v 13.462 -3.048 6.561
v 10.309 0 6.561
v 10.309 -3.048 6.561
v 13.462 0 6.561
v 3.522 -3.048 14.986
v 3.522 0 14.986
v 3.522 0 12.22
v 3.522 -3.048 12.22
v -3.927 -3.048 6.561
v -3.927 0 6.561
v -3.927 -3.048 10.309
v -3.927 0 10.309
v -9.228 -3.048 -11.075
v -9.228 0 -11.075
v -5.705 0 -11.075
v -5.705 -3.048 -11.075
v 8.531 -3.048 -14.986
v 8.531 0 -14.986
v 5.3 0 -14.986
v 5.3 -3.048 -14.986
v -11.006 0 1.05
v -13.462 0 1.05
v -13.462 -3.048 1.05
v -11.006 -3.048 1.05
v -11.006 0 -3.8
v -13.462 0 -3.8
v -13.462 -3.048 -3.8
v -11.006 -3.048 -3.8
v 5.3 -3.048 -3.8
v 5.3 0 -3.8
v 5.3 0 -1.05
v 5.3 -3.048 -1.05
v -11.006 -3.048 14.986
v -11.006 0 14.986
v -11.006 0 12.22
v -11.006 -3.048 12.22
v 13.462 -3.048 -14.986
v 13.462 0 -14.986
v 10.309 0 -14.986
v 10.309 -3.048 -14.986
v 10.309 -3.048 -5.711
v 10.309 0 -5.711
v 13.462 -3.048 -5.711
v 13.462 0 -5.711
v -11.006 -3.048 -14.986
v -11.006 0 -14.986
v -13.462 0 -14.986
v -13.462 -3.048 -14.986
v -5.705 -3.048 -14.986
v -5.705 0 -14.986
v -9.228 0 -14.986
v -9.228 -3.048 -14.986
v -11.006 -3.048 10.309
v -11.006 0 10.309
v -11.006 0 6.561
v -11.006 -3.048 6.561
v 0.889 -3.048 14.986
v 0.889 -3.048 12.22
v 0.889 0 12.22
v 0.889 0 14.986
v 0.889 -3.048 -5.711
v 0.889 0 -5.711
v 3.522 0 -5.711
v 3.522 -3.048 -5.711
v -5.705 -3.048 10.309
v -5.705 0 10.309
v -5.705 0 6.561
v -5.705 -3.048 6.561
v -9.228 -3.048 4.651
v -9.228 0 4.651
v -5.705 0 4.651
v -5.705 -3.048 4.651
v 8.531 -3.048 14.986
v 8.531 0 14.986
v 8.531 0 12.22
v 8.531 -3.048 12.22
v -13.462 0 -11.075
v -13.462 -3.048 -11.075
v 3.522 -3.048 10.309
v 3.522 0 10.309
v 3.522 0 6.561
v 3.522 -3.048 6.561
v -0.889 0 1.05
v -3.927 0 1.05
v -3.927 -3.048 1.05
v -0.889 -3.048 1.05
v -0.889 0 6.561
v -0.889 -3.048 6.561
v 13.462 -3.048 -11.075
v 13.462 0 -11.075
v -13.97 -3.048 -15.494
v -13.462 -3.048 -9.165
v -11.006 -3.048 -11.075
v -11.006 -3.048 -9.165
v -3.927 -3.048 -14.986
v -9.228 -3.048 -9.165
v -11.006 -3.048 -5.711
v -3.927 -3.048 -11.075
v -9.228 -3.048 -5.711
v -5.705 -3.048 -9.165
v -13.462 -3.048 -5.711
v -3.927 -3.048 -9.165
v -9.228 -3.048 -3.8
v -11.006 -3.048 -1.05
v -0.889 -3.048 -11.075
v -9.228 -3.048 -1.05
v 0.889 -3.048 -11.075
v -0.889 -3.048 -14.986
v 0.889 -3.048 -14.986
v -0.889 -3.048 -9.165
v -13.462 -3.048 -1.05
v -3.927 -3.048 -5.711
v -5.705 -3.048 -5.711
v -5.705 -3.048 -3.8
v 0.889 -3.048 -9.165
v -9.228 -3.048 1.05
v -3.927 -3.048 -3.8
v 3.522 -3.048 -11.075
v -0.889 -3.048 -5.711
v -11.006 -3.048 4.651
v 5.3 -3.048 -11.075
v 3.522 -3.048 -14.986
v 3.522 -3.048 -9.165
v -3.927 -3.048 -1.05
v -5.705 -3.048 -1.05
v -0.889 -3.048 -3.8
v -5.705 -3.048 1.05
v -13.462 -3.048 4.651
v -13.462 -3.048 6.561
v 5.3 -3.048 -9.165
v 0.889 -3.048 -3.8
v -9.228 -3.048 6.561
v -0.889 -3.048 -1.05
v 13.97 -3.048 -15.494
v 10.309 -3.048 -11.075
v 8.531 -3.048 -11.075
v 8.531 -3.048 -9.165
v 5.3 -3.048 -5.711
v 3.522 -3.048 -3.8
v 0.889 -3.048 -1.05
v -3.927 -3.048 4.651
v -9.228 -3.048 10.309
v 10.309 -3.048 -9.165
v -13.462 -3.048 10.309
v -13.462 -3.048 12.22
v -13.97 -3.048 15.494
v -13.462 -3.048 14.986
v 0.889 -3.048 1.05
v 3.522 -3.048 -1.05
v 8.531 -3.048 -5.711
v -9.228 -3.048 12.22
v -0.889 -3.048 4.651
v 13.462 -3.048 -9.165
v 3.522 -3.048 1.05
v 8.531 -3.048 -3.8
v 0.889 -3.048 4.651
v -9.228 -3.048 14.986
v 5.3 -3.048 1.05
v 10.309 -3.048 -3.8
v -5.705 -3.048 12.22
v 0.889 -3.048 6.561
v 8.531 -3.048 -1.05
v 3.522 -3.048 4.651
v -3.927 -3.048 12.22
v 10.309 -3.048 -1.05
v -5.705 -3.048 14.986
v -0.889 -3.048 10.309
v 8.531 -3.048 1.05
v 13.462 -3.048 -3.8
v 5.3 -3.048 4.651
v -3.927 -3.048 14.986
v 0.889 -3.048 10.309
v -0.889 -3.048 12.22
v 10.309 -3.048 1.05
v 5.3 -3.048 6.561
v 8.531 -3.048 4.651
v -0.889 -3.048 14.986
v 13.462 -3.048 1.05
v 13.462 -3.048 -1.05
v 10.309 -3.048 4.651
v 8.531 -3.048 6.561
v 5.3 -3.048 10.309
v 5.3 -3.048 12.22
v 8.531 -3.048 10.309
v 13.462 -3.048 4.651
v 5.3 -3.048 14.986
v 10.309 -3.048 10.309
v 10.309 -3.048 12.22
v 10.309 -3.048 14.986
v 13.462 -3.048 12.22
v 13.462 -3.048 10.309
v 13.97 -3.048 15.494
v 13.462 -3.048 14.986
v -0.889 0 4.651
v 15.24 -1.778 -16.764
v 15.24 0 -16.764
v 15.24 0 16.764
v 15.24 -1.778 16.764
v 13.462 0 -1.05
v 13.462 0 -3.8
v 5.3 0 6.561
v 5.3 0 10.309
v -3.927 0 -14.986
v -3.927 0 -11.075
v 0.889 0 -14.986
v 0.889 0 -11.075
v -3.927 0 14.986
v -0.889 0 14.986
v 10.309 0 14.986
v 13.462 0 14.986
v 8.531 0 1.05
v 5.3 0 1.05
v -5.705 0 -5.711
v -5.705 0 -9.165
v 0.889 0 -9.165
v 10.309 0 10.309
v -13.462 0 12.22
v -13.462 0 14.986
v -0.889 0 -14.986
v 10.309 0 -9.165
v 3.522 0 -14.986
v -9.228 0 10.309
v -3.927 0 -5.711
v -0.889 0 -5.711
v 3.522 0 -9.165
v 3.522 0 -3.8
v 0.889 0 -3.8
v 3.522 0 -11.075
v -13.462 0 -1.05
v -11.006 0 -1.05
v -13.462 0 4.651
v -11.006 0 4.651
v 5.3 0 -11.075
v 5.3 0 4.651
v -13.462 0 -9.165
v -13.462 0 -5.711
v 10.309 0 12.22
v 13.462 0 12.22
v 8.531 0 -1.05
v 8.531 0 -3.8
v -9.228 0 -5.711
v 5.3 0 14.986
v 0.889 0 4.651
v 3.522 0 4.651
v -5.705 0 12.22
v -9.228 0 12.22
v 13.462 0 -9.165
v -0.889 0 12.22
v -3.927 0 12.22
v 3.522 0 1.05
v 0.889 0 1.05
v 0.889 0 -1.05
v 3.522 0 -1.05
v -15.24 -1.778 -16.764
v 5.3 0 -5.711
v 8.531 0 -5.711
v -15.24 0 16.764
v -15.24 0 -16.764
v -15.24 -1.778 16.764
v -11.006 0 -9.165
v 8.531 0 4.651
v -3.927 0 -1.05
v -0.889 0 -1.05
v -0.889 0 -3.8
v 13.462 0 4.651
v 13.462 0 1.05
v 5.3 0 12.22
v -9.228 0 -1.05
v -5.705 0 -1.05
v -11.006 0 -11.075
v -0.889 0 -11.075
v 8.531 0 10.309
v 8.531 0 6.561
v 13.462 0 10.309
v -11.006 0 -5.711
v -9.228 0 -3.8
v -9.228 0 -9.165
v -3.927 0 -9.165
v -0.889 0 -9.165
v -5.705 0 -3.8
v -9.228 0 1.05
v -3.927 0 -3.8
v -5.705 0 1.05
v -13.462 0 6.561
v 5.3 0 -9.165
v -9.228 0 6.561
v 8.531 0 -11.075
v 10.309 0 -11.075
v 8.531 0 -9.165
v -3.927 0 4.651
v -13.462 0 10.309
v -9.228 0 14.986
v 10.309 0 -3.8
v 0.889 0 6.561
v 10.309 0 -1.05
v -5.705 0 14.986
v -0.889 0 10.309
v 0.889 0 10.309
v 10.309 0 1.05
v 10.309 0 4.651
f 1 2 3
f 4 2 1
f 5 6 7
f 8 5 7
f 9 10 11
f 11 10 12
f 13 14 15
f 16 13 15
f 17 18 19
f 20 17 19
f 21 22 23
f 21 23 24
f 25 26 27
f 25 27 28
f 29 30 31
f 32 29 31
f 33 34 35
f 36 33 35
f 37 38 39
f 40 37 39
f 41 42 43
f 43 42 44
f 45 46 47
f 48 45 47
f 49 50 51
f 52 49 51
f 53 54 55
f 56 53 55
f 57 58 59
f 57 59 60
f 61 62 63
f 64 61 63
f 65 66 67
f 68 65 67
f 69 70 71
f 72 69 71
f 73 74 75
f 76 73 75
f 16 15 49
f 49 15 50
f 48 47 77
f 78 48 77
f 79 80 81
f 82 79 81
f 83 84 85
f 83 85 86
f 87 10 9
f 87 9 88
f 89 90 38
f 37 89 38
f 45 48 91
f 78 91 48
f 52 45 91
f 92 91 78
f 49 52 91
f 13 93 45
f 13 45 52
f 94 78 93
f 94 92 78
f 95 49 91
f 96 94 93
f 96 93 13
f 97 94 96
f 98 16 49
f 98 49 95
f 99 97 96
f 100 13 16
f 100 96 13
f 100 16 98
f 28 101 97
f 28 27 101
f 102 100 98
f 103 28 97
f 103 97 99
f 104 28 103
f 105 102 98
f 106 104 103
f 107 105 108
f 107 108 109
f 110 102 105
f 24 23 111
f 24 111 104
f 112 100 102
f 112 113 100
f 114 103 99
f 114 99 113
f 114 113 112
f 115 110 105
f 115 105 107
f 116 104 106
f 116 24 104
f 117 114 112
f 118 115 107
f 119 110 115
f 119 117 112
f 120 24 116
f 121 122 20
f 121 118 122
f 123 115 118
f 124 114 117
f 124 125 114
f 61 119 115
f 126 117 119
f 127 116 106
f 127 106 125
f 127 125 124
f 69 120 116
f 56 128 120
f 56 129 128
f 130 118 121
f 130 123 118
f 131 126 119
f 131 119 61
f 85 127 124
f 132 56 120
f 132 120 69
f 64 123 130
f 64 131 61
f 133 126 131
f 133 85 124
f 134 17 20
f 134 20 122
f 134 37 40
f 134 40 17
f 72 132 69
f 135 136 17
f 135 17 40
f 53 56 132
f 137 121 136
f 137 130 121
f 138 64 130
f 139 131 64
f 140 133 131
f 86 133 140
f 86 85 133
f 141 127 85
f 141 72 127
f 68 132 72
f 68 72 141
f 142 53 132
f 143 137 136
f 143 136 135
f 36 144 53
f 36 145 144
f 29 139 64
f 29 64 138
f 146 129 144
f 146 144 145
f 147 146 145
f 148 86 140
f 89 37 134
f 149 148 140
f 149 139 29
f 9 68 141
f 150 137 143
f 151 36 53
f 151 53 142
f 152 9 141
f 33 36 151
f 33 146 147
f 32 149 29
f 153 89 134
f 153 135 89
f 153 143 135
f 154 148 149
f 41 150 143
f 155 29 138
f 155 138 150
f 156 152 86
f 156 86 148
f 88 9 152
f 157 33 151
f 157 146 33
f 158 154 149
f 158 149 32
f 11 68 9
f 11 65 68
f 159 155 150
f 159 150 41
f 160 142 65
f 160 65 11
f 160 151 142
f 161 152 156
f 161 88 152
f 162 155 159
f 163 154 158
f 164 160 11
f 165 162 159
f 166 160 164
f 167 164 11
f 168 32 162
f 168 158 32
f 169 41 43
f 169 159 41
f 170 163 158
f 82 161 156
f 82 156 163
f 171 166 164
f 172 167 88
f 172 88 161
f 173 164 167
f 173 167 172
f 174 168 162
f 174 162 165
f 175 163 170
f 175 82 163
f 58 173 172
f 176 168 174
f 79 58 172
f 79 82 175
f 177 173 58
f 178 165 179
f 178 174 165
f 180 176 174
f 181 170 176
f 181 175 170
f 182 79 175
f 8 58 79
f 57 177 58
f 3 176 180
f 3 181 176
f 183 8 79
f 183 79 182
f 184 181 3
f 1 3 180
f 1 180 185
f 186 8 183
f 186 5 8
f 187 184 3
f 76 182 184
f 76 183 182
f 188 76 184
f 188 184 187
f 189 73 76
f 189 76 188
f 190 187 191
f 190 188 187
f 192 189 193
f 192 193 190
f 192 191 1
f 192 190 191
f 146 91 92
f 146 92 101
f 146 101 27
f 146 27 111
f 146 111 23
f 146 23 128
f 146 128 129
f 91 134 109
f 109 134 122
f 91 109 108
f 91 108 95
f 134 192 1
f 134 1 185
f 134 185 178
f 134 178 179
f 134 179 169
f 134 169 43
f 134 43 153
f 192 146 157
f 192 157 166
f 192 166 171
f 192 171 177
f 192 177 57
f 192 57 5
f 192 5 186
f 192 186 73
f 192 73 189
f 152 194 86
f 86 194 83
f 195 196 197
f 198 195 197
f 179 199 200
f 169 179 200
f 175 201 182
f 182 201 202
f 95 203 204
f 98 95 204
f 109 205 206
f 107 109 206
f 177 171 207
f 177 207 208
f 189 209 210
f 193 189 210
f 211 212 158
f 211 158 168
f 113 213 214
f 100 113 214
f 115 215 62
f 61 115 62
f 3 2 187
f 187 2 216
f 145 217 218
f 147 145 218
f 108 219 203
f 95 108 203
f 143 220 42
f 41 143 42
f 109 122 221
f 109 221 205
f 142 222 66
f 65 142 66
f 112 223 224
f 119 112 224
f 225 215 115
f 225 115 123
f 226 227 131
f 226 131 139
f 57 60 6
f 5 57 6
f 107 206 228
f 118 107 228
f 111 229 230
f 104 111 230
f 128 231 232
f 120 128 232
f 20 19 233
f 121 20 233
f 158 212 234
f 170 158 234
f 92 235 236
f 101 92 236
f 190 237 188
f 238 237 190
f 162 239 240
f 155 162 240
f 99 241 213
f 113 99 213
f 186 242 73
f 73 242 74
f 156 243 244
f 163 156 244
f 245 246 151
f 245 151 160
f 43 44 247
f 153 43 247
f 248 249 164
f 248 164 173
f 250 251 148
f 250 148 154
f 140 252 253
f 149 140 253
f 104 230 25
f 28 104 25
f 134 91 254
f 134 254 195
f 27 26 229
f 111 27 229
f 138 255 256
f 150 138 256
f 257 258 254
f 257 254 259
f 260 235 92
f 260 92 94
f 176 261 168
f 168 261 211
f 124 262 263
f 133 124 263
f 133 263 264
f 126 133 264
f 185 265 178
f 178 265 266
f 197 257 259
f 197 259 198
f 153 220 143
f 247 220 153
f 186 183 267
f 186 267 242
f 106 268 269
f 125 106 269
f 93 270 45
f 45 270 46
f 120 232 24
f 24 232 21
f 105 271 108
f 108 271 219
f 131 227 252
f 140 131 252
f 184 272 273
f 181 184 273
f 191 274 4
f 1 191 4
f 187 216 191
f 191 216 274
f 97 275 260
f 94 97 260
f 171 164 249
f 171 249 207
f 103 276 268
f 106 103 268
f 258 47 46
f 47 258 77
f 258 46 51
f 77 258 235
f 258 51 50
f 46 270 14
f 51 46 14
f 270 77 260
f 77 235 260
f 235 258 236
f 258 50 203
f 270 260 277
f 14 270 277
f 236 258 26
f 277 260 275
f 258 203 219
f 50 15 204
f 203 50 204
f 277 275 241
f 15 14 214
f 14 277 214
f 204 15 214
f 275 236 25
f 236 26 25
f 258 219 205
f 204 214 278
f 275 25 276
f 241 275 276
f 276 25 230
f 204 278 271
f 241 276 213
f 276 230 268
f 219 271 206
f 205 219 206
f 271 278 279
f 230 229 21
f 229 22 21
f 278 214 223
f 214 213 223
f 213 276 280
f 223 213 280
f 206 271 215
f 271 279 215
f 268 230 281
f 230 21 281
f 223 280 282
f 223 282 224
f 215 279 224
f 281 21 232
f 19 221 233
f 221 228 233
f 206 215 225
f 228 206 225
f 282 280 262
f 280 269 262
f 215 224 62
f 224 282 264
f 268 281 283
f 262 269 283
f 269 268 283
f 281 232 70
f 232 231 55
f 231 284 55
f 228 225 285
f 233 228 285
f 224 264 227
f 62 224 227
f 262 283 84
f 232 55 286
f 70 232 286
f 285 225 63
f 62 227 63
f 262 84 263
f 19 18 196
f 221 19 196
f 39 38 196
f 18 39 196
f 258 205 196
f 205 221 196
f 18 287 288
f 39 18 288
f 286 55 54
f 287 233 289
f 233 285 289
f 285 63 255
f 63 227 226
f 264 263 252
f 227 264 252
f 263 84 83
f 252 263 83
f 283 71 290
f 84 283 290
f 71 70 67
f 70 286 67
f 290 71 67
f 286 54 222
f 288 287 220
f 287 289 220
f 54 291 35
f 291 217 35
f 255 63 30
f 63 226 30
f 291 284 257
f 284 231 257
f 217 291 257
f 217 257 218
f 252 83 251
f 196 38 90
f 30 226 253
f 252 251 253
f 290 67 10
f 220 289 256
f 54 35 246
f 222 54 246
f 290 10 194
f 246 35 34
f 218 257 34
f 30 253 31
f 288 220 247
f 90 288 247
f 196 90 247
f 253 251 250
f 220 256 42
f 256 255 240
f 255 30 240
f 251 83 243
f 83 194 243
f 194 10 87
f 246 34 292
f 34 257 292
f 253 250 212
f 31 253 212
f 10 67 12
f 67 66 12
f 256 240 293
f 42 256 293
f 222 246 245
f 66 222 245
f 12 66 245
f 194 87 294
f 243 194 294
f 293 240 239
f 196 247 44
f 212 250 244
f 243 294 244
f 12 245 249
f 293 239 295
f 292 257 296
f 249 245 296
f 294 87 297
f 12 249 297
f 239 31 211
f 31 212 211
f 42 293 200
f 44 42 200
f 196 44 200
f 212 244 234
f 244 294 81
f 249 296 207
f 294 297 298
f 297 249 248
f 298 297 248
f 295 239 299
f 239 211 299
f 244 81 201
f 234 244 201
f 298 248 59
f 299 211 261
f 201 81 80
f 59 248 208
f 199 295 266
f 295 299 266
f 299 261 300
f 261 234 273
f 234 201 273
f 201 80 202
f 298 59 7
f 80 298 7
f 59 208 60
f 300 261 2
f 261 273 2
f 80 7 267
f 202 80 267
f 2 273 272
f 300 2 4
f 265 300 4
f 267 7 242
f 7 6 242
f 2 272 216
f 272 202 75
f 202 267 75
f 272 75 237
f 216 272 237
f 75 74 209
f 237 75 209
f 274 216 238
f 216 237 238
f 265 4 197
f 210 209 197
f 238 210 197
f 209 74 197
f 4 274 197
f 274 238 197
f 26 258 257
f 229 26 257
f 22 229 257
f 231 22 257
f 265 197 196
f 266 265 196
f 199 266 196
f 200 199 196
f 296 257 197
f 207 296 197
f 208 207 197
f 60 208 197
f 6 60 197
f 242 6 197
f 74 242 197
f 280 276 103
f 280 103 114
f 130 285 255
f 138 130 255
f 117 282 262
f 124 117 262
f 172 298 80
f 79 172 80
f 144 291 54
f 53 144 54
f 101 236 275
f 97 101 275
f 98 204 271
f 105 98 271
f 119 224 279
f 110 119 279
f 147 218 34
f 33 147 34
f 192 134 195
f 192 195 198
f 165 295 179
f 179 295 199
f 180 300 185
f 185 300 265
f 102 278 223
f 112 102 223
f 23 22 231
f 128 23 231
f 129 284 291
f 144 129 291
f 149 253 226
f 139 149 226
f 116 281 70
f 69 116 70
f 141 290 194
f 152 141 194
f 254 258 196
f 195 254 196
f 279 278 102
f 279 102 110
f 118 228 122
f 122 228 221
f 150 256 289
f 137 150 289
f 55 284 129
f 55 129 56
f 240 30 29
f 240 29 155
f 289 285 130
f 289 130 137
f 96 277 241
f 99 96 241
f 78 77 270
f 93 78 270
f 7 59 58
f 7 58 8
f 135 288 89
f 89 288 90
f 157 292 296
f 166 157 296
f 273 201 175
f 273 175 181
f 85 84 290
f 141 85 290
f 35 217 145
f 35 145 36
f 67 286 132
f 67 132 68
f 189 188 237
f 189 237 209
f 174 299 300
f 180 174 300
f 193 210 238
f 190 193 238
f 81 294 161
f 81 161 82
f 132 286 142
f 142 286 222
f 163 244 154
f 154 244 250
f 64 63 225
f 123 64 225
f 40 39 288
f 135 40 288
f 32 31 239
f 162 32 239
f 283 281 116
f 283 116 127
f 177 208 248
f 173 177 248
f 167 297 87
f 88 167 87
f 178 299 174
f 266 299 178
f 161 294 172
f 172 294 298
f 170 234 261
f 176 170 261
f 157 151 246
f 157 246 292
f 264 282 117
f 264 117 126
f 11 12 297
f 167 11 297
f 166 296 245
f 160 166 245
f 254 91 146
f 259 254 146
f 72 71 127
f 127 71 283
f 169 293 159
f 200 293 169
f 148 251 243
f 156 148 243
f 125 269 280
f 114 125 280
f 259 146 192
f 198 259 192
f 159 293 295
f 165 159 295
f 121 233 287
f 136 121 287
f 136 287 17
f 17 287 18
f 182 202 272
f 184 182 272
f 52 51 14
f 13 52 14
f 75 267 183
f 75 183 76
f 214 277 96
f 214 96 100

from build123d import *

# Parameters (mm, degrees)
F0_W     = 30.48
F0_H     = 33.528
F0_W_2   = 1.778
F0_H_2   = 2.7663977579
F0_H_3   = 1.9106194377
F0_H_4   = 3.7477533333
F0_H_5   = 3.6007831804
F0_H_6   = 2.099653706
F0_H_7   = 2.7503813617
F0_H_8   = 3.4538120963
F0_H_9   = 3.9107408137
F0_W_3   = 3.1533570525
F0_W_4   = 3.2304820977
F0_W_5   = 2.6331608498
F0_W_6   = 3.0382862671
F0_W_7   = 3.5224076404
F0_W_8   = 2.4563060925
F1_DEPTH = 3.048
F2_SIZE  = 1.27


with BuildPart() as f1:
    # F0 (on Front) → F1 (new body)
    with BuildSketch(Plane.XZ):
        Rectangle(F0_W, F0_H)
        Polygon((-13.462, 12.2196022421), (-13.462, 14.986), (-11.0056939075, 14.986), (-9.2276939075, 14.986), (-5.7052862671, 14.986), (-3.9272862671, 14.986), (-0.889, 14.986), (0.889, 14.986), (3.5221608498, 14.986), (5.3001608498, 14.986), (8.5306429475, 14.986), (10.3086429475, 14.986), (13.462, 14.986), (13.462, 12.2196022421), (13.462, 10.3089828044), (13.462, 6.5612294711), (13.462, 4.6506100334), (13.462, 1.049826853), (13.462, -1.049826853), (13.462, -3.8002082147), (13.462, -5.7108276524), (13.462, -9.1646397486), (13.462, -11.0752591863), (13.462, -14.986), (10.3086429475, -14.986), (8.5306429475, -14.986), (5.3001608498, -14.986), (3.5221608498, -14.986), (0.889, -14.986), (-0.889, -14.986), (-3.9272862671, -14.986), (-5.7052862671, -14.986), (-9.2276939075, -14.986), (-11.0056939075, -14.986), (-13.462, -14.986), (-13.462, -11.0752591863), (-13.462, -9.1646397486), (-13.462, -5.7108276524), (-13.462, -3.8002082147), (-13.462, -1.049826853), (-13.462, 1.049826853), (-13.462, 4.6506100334), (-13.462, 6.5612294711), (-13.462, 10.3089828044), align=None, mode=Mode.SUBTRACT)
        with Locations((-10.1166939075, 13.6028011211)):
            Rectangle(F0_W_2, F0_H_2)
        with Locations((-10.1166939075, 11.2642925233)):
            Rectangle(F0_W_2, F0_H_3)
        with Locations((-10.1166939075, 8.4351061378)):
            Rectangle(F0_W_2, F0_H_4)
        with Locations((-10.1166939075, 5.6059197523)):
            Rectangle(F0_W_2, F0_H_3)
        with Locations((-10.1166939075, 2.8502184432)):
            Rectangle(F0_W_2, F0_H_5)
        with Locations((-10.1166939075, 0)):
            Rectangle(F0_W_2, F0_H_6)
        with Locations((-10.1166939075, -2.4250175338)):
            Rectangle(F0_W_2, F0_H_7)
        with Locations((-10.1166939075, -4.7555179335)):
            Rectangle(F0_W_2, F0_H_3)
        with Locations((-10.1166939075, -7.4377337005)):
            Rectangle(F0_W_2, F0_H_8)
        with Locations((-10.1166939075, -10.1199494675)):
            Rectangle(F0_W_2, F0_H_3)
        with Locations((-10.1166939075, -13.0306295932)):
            Rectangle(F0_W_2, F0_H_9)
        with Locations((-4.8162862671, -13.0306295932)):
            Rectangle(F0_W_2, F0_H_9)
        with Locations((-4.8162862671, -10.1199494675)):
            Rectangle(F0_W_2, F0_H_3)
        with Locations((-4.8162862671, -7.4377337005)):
            Rectangle(F0_W_2, F0_H_8)
        with Locations((-4.8162862671, -4.7555179335)):
            Rectangle(F0_W_2, F0_H_3)
        with Locations((-4.8162862671, -2.4250175338)):
            Rectangle(F0_W_2, F0_H_7)
        with Locations((-4.8162862671, 0)):
            Rectangle(F0_W_2, F0_H_6)
        with Locations((-4.8162862671, 2.8502184432)):
            Rectangle(F0_W_2, F0_H_5)
        with Locations((-4.8162862671, 5.6059197523)):
            Rectangle(F0_W_2, F0_H_3)
        with Locations((-4.8162862671, 8.4351061378)):
            Rectangle(F0_W_2, F0_H_4)
        with Locations((-4.8162862671, 11.2642925233)):
            Rectangle(F0_W_2, F0_H_3)
        with Locations((-4.8162862671, 13.6028011211)):
            Rectangle(F0_W_2, F0_H_2)
        with Locations((0, 13.6028011211)):
            Rectangle(F0_W_2, F0_H_2)
        with Locations((0, 11.2642925233)):
            Rectangle(F0_W_2, F0_H_3)
        with Locations((0, 8.4351061378)):
            Rectangle(F0_W_2, F0_H_4)
        with Locations((0, 5.6059197523)):
            Rectangle(F0_W_2, F0_H_3)
        with Locations((0, 2.8502184432)):
            Rectangle(F0_W_2, F0_H_5)
        Rectangle(F0_W_2, F0_H_6)
        with Locations((0, -2.4250175338)):
            Rectangle(F0_W_2, F0_H_7)
        with Locations((0, -4.7555179335)):
            Rectangle(F0_W_2, F0_H_3)
        with Locations((0, -7.4377337005)):
            Rectangle(F0_W_2, F0_H_8)
        with Locations((0, -10.1199494675)):
            Rectangle(F0_W_2, F0_H_3)
        with Locations((0, -13.0306295932)):
            Rectangle(F0_W_2, F0_H_9)
        with Locations((4.4111608498, -13.0306295932)):
            Rectangle(F0_W_2, F0_H_9)
        with Locations((4.4111608498, -10.1199494675)):
            Rectangle(F0_W_2, F0_H_3)
        with Locations((4.4111608498, -7.4377337005)):
            Rectangle(F0_W_2, F0_H_8)
        with Locations((4.4111608498, -4.7555179335)):
            Rectangle(F0_W_2, F0_H_3)
        with Locations((4.4111608498, -2.4250175338)):
            Rectangle(F0_W_2, F0_H_7)
        with Locations((4.4111608498, 0)):
            Rectangle(F0_W_2, F0_H_6)
        with Locations((4.4111608498, 2.8502184432)):
            Rectangle(F0_W_2, F0_H_5)
        with Locations((4.4111608498, 5.6059197523)):
            Rectangle(F0_W_2, F0_H_3)
        with Locations((4.4111608498, 8.4351061378)):
            Rectangle(F0_W_2, F0_H_4)
        with Locations((4.4111608498, 11.2642925233)):
            Rectangle(F0_W_2, F0_H_3)
        with Locations((4.4111608498, 13.6028011211)):
            Rectangle(F0_W_2, F0_H_2)
        with Locations((9.4196429475, 13.6028011211)):
            Rectangle(F0_W_2, F0_H_2)
        with Locations((9.4196429475, 11.2642925233)):
            Rectangle(F0_W_2, F0_H_3)
        with Locations((9.4196429475, 8.4351061378)):
            Rectangle(F0_W_2, F0_H_4)
        with Locations((9.4196429475, 5.6059197523)):
            Rectangle(F0_W_2, F0_H_3)
        with Locations((9.4196429475, 2.8502184432)):
            Rectangle(F0_W_2, F0_H_5)
        with Locations((9.4196429475, 0)):
            Rectangle(F0_W_2, F0_H_6)
        with Locations((9.4196429475, -2.4250175338)):
            Rectangle(F0_W_2, F0_H_7)
        with Locations((9.4196429475, -4.7555179335)):
            Rectangle(F0_W_2, F0_H_3)
        with Locations((9.4196429475, -7.4377337005)):
            Rectangle(F0_W_2, F0_H_8)
        with Locations((9.4196429475, -10.1199494675)):
            Rectangle(F0_W_2, F0_H_3)
        with Locations((9.4196429475, -13.0306295932)):
            Rectangle(F0_W_2, F0_H_9)
        with Locations((11.8853214738, -10.1199494675)):
            Rectangle(F0_W_3, F0_H_3)
        with Locations((6.9154018987, -10.1199494675)):
            Rectangle(F0_W_4, F0_H_3)
        with Locations((2.2055804249, -10.1199494675)):
            Rectangle(F0_W_5, F0_H_3)
        with Locations((-2.4081431336, -10.1199494675)):
            Rectangle(F0_W_6, F0_H_3)
        with Locations((-7.4664900873, -10.1199494675)):
            Rectangle(F0_W_7, F0_H_3)
        with Locations((-12.2338469538, -10.1199494675)):
            Rectangle(F0_W_8, F0_H_3)
        with Locations((-12.2338469538, -4.7555179335)):
            Rectangle(F0_W_8, F0_H_3)
        with Locations((-7.4664900873, -4.7555179335)):
            Rectangle(F0_W_7, F0_H_3)
        with Locations((-2.4081431336, -4.7555179335)):
            Rectangle(F0_W_6, F0_H_3)
        with Locations((2.2055804249, -4.7555179335)):
            Rectangle(F0_W_5, F0_H_3)
        with Locations((6.9154018987, -4.7555179335)):
            Rectangle(F0_W_4, F0_H_3)
        with Locations((11.8853214738, -4.7555179335)):
            Rectangle(F0_W_3, F0_H_3)
        with Locations((11.8853214738, 0)):
            Rectangle(F0_W_3, F0_H_6)
        with Locations((6.9154018987, 0)):
            Rectangle(F0_W_4, F0_H_6)
        with Locations((2.2055804249, 0)):
            Rectangle(F0_W_5, F0_H_6)
        with Locations((-2.4081431336, 0)):
            Rectangle(F0_W_6, F0_H_6)
        with Locations((-7.4664900873, 0)):
            Rectangle(F0_W_7, F0_H_6)
        with Locations((-12.2338469538, 0)):
            Rectangle(F0_W_8, F0_H_6)
        with Locations((-12.2338469538, 5.6059197523)):
            Rectangle(F0_W_8, F0_H_3)
        with Locations((-7.4664900873, 5.6059197523)):
            Rectangle(F0_W_7, F0_H_3)
        with Locations((-2.4081431336, 5.6059197523)):
            Rectangle(F0_W_6, F0_H_3)
        with Locations((2.2055804249, 5.6059197523)):
            Rectangle(F0_W_5, F0_H_3)
        with Locations((6.9154018987, 5.6059197523)):
            Rectangle(F0_W_4, F0_H_3)
        with Locations((11.8853214738, 5.6059197523)):
            Rectangle(F0_W_3, F0_H_3)
        with Locations((11.8853214738, 11.2642925233)):
            Rectangle(F0_W_3, F0_H_3)
        with Locations((6.9154018987, 11.2642925233)):
            Rectangle(F0_W_4, F0_H_3)
        with Locations((2.2055804249, 11.2642925233)):
            Rectangle(F0_W_5, F0_H_3)
        with Locations((-2.4081431336, 11.2642925233)):
            Rectangle(F0_W_6, F0_H_3)
        with Locations((-7.4664900873, 11.2642925233)):
            Rectangle(F0_W_7, F0_H_3)
        with Locations((-12.2338469538, 11.2642925233)):
            Rectangle(F0_W_8, F0_H_3)
    extrude(amount=F1_DEPTH)

    # F2
    f2_edges = [f1.edges().sort_by_distance(p)[0] for p in [
        (-15.24, -3.048, 0),
        (0, -3.048, -16.764),
        (15.24, -3.048, 0),
        (0, -3.048, 16.764),
    ]]
    chamfer(f2_edges, length=F2_SIZE)


solid = f1.part
